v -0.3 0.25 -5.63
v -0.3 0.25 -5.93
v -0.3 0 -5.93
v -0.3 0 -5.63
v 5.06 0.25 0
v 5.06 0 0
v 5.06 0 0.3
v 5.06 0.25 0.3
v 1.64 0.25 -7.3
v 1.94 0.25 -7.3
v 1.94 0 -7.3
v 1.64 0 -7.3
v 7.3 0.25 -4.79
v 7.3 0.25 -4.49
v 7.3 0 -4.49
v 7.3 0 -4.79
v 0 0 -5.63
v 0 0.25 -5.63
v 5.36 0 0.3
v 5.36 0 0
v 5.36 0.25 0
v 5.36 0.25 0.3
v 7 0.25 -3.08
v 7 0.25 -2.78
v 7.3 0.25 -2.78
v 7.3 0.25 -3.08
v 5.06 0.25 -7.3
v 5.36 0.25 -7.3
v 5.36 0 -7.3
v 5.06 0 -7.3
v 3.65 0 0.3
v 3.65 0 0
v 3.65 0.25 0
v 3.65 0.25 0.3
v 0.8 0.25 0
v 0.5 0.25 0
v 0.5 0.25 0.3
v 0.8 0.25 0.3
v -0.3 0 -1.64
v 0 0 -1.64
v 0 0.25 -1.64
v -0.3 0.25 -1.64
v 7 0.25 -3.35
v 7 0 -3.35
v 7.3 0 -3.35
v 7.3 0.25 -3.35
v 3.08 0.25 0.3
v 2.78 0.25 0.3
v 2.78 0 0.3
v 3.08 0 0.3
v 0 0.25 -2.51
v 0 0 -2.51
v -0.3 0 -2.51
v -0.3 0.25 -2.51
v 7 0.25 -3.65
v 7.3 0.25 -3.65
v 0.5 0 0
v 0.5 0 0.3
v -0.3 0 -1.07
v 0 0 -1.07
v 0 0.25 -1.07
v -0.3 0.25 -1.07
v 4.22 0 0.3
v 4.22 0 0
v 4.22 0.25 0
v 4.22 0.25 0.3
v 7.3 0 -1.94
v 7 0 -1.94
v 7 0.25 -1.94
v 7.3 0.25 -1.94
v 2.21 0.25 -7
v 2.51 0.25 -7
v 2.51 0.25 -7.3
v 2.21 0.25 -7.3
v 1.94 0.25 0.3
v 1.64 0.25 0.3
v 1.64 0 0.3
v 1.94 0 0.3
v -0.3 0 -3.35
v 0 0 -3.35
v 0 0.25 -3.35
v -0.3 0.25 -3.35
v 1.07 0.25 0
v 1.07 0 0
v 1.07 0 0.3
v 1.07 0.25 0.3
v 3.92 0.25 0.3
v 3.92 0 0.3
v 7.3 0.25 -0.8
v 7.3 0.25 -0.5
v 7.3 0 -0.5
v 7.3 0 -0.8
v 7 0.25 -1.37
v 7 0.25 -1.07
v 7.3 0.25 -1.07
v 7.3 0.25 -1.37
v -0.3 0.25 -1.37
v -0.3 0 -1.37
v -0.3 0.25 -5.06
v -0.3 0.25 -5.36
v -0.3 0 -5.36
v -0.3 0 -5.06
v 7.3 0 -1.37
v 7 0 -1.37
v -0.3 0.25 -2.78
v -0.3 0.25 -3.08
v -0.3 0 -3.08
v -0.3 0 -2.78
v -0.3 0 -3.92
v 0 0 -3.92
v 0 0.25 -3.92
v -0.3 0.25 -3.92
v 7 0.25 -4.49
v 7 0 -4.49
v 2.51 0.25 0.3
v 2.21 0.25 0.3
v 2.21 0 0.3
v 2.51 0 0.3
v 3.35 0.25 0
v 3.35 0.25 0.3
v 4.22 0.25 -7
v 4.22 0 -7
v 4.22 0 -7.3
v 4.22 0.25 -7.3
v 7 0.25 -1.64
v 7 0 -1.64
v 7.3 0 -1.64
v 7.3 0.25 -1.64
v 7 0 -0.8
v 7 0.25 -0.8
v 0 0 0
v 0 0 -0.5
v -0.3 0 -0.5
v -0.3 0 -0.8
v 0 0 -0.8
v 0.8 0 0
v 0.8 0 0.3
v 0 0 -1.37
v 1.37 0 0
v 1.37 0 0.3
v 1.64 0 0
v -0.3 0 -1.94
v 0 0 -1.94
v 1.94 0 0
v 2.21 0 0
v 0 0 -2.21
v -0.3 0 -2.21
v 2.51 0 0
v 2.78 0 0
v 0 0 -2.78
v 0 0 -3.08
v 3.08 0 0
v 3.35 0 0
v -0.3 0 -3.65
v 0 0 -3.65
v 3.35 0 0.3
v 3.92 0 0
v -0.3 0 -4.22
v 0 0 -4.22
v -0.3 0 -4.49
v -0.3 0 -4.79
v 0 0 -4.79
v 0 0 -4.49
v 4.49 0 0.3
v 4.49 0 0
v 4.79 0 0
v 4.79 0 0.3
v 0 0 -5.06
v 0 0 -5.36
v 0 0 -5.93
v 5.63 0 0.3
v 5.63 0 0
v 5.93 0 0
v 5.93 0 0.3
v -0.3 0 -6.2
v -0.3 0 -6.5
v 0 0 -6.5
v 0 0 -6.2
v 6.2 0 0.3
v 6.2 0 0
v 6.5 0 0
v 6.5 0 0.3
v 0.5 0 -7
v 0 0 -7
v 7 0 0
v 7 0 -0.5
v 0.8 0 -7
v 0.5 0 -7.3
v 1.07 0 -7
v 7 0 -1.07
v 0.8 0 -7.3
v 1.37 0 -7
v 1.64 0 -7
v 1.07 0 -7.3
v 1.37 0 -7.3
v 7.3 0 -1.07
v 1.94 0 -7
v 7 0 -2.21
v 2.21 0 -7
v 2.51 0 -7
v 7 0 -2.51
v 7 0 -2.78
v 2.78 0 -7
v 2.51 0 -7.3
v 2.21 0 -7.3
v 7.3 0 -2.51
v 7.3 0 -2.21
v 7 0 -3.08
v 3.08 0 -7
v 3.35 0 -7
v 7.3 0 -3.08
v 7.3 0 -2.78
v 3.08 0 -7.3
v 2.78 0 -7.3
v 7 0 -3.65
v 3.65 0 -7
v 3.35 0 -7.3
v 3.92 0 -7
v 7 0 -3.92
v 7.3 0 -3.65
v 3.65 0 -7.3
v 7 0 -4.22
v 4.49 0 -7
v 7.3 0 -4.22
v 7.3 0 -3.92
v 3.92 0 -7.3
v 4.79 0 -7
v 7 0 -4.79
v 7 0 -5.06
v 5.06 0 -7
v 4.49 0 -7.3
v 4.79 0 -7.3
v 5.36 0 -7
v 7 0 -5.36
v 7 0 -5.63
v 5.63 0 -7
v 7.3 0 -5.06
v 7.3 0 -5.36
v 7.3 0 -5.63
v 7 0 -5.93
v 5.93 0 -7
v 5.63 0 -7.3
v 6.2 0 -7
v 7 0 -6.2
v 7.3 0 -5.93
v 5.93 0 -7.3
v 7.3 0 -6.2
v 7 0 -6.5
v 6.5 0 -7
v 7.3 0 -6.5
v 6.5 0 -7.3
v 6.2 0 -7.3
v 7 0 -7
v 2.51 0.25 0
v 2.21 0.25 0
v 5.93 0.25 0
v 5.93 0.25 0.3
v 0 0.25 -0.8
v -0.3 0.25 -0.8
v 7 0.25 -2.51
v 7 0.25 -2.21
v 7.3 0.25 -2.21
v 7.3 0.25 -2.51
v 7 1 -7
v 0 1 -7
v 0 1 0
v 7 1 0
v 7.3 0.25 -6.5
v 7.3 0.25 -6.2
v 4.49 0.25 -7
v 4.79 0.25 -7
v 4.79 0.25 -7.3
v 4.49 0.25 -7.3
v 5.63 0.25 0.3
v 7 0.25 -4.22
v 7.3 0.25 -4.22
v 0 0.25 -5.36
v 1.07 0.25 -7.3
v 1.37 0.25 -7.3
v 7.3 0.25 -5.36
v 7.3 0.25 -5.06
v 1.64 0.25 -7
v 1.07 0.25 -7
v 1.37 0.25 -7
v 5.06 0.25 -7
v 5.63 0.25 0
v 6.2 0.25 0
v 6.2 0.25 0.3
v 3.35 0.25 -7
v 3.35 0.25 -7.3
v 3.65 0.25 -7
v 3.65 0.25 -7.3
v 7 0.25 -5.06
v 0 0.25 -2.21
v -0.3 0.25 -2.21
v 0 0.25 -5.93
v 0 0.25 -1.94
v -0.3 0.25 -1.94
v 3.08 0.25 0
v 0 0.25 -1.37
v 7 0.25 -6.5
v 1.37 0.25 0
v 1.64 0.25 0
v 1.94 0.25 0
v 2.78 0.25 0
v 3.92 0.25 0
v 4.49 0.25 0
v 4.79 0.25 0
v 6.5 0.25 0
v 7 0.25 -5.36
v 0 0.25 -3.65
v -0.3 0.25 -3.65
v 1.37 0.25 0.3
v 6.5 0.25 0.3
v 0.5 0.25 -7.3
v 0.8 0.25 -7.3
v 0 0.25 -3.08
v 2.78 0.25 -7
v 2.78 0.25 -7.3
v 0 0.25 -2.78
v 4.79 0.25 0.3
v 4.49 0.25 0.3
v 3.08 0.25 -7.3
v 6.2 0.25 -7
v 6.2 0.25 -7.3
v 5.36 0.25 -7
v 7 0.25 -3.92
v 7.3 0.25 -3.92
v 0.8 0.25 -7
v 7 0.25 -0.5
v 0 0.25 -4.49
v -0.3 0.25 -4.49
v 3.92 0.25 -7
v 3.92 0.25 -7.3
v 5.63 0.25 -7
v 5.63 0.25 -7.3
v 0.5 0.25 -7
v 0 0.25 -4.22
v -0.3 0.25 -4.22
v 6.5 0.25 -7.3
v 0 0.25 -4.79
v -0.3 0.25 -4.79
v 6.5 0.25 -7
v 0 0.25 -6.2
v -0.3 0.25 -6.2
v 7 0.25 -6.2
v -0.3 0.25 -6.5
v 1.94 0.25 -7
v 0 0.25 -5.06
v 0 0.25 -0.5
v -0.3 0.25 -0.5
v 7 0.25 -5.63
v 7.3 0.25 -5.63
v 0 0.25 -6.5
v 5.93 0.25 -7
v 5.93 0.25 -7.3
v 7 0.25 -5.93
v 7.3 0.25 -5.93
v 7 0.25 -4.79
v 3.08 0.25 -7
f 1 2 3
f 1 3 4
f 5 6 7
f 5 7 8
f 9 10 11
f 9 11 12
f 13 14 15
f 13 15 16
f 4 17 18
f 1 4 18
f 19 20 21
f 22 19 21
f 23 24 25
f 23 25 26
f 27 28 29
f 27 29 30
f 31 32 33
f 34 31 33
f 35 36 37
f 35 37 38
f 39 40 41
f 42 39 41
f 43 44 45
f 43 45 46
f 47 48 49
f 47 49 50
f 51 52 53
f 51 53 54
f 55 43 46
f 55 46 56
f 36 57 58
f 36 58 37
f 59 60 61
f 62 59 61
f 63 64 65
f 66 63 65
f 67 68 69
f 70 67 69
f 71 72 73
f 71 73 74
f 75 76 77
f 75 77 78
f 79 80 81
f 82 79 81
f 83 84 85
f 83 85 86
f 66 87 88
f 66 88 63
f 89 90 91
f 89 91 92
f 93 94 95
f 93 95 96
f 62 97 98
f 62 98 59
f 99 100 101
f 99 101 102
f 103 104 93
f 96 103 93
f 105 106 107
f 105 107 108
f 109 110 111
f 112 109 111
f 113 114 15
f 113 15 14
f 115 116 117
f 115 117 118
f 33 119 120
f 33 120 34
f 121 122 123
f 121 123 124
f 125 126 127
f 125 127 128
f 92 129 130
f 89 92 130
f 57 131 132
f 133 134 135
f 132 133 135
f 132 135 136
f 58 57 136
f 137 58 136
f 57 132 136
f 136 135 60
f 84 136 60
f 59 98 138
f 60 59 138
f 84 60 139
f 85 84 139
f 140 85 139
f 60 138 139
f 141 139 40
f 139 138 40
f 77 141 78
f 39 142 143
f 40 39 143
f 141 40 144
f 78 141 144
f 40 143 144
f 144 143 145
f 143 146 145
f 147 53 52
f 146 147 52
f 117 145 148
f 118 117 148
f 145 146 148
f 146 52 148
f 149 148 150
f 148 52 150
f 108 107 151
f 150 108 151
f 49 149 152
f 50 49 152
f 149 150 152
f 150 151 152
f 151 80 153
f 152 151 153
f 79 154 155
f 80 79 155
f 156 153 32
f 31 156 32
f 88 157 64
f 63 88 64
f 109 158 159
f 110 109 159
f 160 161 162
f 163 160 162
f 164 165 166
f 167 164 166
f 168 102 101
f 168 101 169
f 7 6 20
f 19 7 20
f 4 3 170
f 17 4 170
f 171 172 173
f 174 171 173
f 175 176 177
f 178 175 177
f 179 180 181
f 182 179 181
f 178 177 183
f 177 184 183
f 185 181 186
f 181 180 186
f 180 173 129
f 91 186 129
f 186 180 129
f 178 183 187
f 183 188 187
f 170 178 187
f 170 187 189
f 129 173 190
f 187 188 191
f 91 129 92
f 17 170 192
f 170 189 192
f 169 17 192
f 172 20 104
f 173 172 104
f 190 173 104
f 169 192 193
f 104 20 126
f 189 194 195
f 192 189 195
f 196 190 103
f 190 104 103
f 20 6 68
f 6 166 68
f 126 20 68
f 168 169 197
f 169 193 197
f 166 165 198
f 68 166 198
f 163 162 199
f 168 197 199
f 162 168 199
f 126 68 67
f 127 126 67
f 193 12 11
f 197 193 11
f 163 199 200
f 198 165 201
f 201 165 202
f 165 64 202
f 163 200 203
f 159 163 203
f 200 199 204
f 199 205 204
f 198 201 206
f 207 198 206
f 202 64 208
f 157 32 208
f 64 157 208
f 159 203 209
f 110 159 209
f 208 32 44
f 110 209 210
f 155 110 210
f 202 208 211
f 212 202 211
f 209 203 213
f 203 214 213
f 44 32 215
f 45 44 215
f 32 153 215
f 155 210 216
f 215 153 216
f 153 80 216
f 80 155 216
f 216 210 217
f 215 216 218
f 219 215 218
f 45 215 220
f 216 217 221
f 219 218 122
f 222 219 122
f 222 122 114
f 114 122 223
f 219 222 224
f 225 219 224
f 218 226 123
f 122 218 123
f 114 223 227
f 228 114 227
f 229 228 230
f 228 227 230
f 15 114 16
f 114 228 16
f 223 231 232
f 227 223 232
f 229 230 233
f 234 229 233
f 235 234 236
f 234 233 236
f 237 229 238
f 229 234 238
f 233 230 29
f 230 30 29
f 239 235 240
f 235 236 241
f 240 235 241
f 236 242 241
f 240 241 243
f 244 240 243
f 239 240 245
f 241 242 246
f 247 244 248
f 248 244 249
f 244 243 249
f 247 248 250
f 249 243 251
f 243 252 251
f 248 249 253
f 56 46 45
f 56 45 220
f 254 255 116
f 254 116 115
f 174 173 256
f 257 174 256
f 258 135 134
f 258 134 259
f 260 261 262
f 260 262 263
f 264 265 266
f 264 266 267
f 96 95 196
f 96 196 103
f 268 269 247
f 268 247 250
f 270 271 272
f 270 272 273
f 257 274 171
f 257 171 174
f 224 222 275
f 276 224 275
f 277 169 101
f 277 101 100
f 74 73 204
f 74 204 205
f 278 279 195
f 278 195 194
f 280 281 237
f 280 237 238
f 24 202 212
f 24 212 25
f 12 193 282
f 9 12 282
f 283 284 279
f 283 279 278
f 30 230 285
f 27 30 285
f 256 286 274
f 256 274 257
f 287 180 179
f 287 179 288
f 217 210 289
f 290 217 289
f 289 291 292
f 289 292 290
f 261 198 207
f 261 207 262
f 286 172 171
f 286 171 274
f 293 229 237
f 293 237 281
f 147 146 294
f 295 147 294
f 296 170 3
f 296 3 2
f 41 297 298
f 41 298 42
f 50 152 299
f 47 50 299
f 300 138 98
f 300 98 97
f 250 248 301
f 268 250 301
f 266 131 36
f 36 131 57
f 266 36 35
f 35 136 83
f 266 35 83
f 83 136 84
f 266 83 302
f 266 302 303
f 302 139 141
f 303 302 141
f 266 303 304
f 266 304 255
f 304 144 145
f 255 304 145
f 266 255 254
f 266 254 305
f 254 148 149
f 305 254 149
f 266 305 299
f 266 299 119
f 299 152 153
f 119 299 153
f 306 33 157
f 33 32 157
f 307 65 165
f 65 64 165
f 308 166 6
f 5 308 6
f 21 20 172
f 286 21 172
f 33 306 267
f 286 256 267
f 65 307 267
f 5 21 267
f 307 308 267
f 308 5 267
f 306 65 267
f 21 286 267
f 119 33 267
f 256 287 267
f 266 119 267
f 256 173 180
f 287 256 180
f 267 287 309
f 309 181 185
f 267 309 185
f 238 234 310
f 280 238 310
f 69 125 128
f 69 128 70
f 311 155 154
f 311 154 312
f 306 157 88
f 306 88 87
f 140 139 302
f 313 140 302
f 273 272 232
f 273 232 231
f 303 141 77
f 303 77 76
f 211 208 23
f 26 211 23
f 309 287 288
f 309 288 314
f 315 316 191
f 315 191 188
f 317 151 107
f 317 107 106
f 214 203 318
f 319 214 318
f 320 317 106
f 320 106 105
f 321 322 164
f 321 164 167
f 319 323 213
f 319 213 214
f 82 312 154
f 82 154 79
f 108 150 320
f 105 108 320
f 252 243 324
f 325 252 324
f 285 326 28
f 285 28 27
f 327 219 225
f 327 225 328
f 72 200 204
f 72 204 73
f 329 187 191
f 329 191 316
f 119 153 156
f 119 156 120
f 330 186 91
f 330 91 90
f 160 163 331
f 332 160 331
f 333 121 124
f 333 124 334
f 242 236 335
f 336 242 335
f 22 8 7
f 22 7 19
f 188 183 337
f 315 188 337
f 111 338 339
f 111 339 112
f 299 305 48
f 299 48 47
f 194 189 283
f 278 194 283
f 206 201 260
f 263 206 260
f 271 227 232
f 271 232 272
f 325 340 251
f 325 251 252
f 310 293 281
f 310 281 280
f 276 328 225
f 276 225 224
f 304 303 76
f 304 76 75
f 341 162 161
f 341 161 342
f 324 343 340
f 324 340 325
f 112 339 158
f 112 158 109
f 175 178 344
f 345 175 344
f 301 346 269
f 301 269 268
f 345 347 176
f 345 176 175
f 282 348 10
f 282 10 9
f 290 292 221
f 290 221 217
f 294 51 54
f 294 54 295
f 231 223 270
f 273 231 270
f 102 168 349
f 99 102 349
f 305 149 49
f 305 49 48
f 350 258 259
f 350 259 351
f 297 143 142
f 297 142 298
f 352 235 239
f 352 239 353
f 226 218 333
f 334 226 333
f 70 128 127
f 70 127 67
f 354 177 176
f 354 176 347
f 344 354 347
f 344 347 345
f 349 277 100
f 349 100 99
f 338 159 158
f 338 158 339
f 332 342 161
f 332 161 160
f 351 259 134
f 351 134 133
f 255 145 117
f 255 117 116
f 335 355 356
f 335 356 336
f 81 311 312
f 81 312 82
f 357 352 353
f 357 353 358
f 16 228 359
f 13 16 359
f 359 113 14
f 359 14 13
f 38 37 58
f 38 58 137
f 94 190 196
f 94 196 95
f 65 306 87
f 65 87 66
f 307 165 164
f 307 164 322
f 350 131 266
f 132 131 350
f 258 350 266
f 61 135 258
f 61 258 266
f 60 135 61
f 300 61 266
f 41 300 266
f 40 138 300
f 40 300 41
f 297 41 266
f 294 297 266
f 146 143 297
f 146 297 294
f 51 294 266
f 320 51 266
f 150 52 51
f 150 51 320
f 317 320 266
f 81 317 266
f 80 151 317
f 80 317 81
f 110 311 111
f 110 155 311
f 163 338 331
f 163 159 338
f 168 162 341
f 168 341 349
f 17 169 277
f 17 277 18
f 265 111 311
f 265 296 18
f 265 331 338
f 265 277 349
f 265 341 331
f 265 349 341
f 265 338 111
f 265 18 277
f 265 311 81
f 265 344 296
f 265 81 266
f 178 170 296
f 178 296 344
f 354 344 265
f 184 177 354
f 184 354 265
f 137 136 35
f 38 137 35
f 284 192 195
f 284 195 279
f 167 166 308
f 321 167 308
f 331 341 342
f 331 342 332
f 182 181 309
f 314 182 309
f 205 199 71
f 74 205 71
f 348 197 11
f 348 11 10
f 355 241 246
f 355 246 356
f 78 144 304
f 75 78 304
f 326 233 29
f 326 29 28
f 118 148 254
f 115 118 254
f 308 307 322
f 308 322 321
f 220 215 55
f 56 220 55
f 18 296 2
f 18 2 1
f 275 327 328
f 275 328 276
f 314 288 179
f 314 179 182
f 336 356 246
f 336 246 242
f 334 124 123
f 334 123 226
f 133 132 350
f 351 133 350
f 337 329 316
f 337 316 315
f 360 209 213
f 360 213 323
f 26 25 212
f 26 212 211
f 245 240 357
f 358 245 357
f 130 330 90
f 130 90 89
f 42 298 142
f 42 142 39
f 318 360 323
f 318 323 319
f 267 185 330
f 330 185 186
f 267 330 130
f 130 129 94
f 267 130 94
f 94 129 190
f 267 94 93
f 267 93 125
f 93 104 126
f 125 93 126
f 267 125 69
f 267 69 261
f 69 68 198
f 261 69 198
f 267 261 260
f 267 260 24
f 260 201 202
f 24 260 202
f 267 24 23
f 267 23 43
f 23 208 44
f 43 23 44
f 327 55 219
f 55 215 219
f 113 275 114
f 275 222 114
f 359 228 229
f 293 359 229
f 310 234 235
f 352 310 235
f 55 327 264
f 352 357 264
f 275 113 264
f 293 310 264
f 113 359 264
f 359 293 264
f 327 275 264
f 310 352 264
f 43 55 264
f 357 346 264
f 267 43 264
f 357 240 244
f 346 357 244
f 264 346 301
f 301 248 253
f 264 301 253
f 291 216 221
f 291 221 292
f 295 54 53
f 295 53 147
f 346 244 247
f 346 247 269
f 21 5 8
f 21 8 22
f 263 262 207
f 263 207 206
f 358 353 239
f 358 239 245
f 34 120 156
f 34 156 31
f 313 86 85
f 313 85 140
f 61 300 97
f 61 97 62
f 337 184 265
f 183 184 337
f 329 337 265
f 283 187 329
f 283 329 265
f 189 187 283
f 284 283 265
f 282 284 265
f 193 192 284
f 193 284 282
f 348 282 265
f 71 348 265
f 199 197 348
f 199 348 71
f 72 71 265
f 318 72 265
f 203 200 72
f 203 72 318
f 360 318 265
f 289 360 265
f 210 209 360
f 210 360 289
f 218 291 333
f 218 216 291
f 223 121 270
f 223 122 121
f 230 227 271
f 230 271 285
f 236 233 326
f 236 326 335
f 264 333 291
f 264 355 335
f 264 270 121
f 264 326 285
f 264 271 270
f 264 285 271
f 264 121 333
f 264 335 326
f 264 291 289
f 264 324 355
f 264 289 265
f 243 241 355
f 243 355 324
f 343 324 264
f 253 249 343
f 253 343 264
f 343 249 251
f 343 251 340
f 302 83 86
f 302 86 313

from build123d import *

# Parameters (mm, degrees)
SKETCH1_W           = 7
SKETCH1_H           = 7
BOSS_EXTRUDE1_DEPTH = 1
SKETCH2_W           = 0.3
SKETCH2_H           = 0.25
BOSS_EXTRUDE2_DEPTH = 0.3
SKETCH3_W           = 0.3
SKETCH3_H           = 0.25
BOSS_EXTRUDE3_DEPTH = 0.3
SKETCH4_W           = 0.3
SKETCH4_H           = 0.25
BOSS_EXTRUDE4_DEPTH = 0.3
SKETCH5_W           = 0.3
SKETCH5_H           = 0.25
BOSS_EXTRUDE5_DEPTH = 0.3


with BuildPart() as part:
    # Sketch1 → Boss-Extrude1 (new body)
    with BuildSketch(Plane(origin=(0, 0, 0), x_dir=(1, 0, 0), z_dir=(0, 1, 0))):
        with Locations((3.5, 3.5)):
            Rectangle(SKETCH1_W, SKETCH1_H)
    extrude(amount=BOSS_EXTRUDE1_DEPTH)

    # Sketch2 → Boss-Extrude2 (add)
    with BuildSketch(Plane.XY):
        with Locations((0.65, 0.125)):
            Rectangle(SKETCH2_W, SKETCH2_H)
        with Locations((1.22, 0.125)):
            Rectangle(SKETCH2_W, SKETCH2_H)
        with Locations((1.79, 0.125)):
            Rectangle(SKETCH2_W, SKETCH2_H)
        with Locations((2.36, 0.125)):
            Rectangle(SKETCH2_W, SKETCH2_H)
        with Locations((2.93, 0.125)):
            Rectangle(SKETCH2_W, SKETCH2_H)
        with Locations((3.5, 0.125)):
            Rectangle(SKETCH2_W, SKETCH2_H)
        with Locations((4.07, 0.125)):
            Rectangle(SKETCH2_W, SKETCH2_H)
        with Locations((4.64, 0.125)):
            Rectangle(SKETCH2_W, SKETCH2_H)
        with Locations((5.21, 0.125)):
            Rectangle(SKETCH2_W, SKETCH2_H)
        with Locations((5.78, 0.125)):
            Rectangle(SKETCH2_W, SKETCH2_H)
        with Locations((6.35, 0.125)):
            Rectangle(SKETCH2_W, SKETCH2_H)
    extrude(amount=BOSS_EXTRUDE2_DEPTH)

    # Sketch3 → Boss-Extrude3 (add)
    with BuildSketch(Plane(origin=(7, 0, 0), x_dir=(0, 0, -1), z_dir=(1, 0, 0))):
        with Locations((0.65, 0.125)):
            Rectangle(SKETCH3_W, SKETCH3_H)
        with Locations((1.22, 0.125)):
            Rectangle(SKETCH3_W, SKETCH3_H)
        with Locations((1.79, 0.125)):
            Rectangle(SKETCH3_W, SKETCH3_H)
        with Locations((2.36, 0.125)):
            Rectangle(SKETCH3_W, SKETCH3_H)
        with Locations((2.93, 0.125)):
            Rectangle(SKETCH3_W, SKETCH3_H)
        with Locations((3.5, 0.125)):
            Rectangle(SKETCH3_W, SKETCH3_H)
        with Locations((4.07, 0.125)):
            Rectangle(SKETCH3_W, SKETCH3_H)
        with Locations((4.64, 0.125)):
            Rectangle(SKETCH3_W, SKETCH3_H)
        with Locations((5.21, 0.125)):
            Rectangle(SKETCH3_W, SKETCH3_H)
        with Locations((5.78, 0.125)):
            Rectangle(SKETCH3_W, SKETCH3_H)
        with Locations((6.35, 0.125)):
            Rectangle(SKETCH3_W, SKETCH3_H)
    extrude(amount=BOSS_EXTRUDE3_DEPTH)

    # Sketch4 → Boss-Extrude4 (add)
    with BuildSketch(Plane(origin=(0, 0, -7), x_dir=(-1, 0, 0), z_dir=(0, 0, -1))):
        with Locations((-6.35, 0.125)):
            Rectangle(SKETCH4_W, SKETCH4_H)
        with Locations((-5.78, 0.125)):
            Rectangle(SKETCH4_W, SKETCH4_H)
        with Locations((-5.21, 0.125)):
            Rectangle(SKETCH4_W, SKETCH4_H)
        with Locations((-4.64, 0.125)):
            Rectangle(SKETCH4_W, SKETCH4_H)
        with Locations((-4.07, 0.125)):
            Rectangle(SKETCH4_W, SKETCH4_H)
        with Locations((-3.5, 0.125)):
            Rectangle(SKETCH4_W, SKETCH4_H)
        with Locations((-2.93, 0.125)):
            Rectangle(SKETCH4_W, SKETCH4_H)
        with Locations((-2.36, 0.125)):
            Rectangle(SKETCH4_W, SKETCH4_H)
        with Locations((-1.79, 0.125)):
            Rectangle(SKETCH4_W, SKETCH4_H)
        with Locations((-1.22, 0.125)):
            Rectangle(SKETCH4_W, SKETCH4_H)
        with Locations((-0.65, 0.125)):
            Rectangle(SKETCH4_W, SKETCH4_H)
    extrude(amount=BOSS_EXTRUDE4_DEPTH)

    # Sketch5 → Boss-Extrude5 (add)
    with BuildSketch(Plane.ZY):
        with Locations((-6.35, 0.125)):
            Rectangle(SKETCH5_W, SKETCH5_H)
        with Locations((-5.78, 0.125)):
            Rectangle(SKETCH5_W, SKETCH5_H)
        with Locations((-5.21, 0.125)):
            Rectangle(SKETCH5_W, SKETCH5_H)
        with Locations((-4.64, 0.125)):
            Rectangle(SKETCH5_W, SKETCH5_H)
        with Locations((-4.07, 0.125)):
            Rectangle(SKETCH5_W, SKETCH5_H)
        with Locations((-3.5, 0.125)):
            Rectangle(SKETCH5_W, SKETCH5_H)
        with Locations((-2.93, 0.125)):
            Rectangle(SKETCH5_W, SKETCH5_H)
        with Locations((-2.36, 0.125)):
            Rectangle(SKETCH5_W, SKETCH5_H)
        with Locations((-1.79, 0.125)):
            Rectangle(SKETCH5_W, SKETCH5_H)
        with Locations((-1.22, 0.125)):
            Rectangle(SKETCH5_W, SKETCH5_H)
        with Locations((-0.65, 0.125)):
            Rectangle(SKETCH5_W, SKETCH5_H)
    extrude(amount=BOSS_EXTRUDE5_DEPTH)


solid = part.part
